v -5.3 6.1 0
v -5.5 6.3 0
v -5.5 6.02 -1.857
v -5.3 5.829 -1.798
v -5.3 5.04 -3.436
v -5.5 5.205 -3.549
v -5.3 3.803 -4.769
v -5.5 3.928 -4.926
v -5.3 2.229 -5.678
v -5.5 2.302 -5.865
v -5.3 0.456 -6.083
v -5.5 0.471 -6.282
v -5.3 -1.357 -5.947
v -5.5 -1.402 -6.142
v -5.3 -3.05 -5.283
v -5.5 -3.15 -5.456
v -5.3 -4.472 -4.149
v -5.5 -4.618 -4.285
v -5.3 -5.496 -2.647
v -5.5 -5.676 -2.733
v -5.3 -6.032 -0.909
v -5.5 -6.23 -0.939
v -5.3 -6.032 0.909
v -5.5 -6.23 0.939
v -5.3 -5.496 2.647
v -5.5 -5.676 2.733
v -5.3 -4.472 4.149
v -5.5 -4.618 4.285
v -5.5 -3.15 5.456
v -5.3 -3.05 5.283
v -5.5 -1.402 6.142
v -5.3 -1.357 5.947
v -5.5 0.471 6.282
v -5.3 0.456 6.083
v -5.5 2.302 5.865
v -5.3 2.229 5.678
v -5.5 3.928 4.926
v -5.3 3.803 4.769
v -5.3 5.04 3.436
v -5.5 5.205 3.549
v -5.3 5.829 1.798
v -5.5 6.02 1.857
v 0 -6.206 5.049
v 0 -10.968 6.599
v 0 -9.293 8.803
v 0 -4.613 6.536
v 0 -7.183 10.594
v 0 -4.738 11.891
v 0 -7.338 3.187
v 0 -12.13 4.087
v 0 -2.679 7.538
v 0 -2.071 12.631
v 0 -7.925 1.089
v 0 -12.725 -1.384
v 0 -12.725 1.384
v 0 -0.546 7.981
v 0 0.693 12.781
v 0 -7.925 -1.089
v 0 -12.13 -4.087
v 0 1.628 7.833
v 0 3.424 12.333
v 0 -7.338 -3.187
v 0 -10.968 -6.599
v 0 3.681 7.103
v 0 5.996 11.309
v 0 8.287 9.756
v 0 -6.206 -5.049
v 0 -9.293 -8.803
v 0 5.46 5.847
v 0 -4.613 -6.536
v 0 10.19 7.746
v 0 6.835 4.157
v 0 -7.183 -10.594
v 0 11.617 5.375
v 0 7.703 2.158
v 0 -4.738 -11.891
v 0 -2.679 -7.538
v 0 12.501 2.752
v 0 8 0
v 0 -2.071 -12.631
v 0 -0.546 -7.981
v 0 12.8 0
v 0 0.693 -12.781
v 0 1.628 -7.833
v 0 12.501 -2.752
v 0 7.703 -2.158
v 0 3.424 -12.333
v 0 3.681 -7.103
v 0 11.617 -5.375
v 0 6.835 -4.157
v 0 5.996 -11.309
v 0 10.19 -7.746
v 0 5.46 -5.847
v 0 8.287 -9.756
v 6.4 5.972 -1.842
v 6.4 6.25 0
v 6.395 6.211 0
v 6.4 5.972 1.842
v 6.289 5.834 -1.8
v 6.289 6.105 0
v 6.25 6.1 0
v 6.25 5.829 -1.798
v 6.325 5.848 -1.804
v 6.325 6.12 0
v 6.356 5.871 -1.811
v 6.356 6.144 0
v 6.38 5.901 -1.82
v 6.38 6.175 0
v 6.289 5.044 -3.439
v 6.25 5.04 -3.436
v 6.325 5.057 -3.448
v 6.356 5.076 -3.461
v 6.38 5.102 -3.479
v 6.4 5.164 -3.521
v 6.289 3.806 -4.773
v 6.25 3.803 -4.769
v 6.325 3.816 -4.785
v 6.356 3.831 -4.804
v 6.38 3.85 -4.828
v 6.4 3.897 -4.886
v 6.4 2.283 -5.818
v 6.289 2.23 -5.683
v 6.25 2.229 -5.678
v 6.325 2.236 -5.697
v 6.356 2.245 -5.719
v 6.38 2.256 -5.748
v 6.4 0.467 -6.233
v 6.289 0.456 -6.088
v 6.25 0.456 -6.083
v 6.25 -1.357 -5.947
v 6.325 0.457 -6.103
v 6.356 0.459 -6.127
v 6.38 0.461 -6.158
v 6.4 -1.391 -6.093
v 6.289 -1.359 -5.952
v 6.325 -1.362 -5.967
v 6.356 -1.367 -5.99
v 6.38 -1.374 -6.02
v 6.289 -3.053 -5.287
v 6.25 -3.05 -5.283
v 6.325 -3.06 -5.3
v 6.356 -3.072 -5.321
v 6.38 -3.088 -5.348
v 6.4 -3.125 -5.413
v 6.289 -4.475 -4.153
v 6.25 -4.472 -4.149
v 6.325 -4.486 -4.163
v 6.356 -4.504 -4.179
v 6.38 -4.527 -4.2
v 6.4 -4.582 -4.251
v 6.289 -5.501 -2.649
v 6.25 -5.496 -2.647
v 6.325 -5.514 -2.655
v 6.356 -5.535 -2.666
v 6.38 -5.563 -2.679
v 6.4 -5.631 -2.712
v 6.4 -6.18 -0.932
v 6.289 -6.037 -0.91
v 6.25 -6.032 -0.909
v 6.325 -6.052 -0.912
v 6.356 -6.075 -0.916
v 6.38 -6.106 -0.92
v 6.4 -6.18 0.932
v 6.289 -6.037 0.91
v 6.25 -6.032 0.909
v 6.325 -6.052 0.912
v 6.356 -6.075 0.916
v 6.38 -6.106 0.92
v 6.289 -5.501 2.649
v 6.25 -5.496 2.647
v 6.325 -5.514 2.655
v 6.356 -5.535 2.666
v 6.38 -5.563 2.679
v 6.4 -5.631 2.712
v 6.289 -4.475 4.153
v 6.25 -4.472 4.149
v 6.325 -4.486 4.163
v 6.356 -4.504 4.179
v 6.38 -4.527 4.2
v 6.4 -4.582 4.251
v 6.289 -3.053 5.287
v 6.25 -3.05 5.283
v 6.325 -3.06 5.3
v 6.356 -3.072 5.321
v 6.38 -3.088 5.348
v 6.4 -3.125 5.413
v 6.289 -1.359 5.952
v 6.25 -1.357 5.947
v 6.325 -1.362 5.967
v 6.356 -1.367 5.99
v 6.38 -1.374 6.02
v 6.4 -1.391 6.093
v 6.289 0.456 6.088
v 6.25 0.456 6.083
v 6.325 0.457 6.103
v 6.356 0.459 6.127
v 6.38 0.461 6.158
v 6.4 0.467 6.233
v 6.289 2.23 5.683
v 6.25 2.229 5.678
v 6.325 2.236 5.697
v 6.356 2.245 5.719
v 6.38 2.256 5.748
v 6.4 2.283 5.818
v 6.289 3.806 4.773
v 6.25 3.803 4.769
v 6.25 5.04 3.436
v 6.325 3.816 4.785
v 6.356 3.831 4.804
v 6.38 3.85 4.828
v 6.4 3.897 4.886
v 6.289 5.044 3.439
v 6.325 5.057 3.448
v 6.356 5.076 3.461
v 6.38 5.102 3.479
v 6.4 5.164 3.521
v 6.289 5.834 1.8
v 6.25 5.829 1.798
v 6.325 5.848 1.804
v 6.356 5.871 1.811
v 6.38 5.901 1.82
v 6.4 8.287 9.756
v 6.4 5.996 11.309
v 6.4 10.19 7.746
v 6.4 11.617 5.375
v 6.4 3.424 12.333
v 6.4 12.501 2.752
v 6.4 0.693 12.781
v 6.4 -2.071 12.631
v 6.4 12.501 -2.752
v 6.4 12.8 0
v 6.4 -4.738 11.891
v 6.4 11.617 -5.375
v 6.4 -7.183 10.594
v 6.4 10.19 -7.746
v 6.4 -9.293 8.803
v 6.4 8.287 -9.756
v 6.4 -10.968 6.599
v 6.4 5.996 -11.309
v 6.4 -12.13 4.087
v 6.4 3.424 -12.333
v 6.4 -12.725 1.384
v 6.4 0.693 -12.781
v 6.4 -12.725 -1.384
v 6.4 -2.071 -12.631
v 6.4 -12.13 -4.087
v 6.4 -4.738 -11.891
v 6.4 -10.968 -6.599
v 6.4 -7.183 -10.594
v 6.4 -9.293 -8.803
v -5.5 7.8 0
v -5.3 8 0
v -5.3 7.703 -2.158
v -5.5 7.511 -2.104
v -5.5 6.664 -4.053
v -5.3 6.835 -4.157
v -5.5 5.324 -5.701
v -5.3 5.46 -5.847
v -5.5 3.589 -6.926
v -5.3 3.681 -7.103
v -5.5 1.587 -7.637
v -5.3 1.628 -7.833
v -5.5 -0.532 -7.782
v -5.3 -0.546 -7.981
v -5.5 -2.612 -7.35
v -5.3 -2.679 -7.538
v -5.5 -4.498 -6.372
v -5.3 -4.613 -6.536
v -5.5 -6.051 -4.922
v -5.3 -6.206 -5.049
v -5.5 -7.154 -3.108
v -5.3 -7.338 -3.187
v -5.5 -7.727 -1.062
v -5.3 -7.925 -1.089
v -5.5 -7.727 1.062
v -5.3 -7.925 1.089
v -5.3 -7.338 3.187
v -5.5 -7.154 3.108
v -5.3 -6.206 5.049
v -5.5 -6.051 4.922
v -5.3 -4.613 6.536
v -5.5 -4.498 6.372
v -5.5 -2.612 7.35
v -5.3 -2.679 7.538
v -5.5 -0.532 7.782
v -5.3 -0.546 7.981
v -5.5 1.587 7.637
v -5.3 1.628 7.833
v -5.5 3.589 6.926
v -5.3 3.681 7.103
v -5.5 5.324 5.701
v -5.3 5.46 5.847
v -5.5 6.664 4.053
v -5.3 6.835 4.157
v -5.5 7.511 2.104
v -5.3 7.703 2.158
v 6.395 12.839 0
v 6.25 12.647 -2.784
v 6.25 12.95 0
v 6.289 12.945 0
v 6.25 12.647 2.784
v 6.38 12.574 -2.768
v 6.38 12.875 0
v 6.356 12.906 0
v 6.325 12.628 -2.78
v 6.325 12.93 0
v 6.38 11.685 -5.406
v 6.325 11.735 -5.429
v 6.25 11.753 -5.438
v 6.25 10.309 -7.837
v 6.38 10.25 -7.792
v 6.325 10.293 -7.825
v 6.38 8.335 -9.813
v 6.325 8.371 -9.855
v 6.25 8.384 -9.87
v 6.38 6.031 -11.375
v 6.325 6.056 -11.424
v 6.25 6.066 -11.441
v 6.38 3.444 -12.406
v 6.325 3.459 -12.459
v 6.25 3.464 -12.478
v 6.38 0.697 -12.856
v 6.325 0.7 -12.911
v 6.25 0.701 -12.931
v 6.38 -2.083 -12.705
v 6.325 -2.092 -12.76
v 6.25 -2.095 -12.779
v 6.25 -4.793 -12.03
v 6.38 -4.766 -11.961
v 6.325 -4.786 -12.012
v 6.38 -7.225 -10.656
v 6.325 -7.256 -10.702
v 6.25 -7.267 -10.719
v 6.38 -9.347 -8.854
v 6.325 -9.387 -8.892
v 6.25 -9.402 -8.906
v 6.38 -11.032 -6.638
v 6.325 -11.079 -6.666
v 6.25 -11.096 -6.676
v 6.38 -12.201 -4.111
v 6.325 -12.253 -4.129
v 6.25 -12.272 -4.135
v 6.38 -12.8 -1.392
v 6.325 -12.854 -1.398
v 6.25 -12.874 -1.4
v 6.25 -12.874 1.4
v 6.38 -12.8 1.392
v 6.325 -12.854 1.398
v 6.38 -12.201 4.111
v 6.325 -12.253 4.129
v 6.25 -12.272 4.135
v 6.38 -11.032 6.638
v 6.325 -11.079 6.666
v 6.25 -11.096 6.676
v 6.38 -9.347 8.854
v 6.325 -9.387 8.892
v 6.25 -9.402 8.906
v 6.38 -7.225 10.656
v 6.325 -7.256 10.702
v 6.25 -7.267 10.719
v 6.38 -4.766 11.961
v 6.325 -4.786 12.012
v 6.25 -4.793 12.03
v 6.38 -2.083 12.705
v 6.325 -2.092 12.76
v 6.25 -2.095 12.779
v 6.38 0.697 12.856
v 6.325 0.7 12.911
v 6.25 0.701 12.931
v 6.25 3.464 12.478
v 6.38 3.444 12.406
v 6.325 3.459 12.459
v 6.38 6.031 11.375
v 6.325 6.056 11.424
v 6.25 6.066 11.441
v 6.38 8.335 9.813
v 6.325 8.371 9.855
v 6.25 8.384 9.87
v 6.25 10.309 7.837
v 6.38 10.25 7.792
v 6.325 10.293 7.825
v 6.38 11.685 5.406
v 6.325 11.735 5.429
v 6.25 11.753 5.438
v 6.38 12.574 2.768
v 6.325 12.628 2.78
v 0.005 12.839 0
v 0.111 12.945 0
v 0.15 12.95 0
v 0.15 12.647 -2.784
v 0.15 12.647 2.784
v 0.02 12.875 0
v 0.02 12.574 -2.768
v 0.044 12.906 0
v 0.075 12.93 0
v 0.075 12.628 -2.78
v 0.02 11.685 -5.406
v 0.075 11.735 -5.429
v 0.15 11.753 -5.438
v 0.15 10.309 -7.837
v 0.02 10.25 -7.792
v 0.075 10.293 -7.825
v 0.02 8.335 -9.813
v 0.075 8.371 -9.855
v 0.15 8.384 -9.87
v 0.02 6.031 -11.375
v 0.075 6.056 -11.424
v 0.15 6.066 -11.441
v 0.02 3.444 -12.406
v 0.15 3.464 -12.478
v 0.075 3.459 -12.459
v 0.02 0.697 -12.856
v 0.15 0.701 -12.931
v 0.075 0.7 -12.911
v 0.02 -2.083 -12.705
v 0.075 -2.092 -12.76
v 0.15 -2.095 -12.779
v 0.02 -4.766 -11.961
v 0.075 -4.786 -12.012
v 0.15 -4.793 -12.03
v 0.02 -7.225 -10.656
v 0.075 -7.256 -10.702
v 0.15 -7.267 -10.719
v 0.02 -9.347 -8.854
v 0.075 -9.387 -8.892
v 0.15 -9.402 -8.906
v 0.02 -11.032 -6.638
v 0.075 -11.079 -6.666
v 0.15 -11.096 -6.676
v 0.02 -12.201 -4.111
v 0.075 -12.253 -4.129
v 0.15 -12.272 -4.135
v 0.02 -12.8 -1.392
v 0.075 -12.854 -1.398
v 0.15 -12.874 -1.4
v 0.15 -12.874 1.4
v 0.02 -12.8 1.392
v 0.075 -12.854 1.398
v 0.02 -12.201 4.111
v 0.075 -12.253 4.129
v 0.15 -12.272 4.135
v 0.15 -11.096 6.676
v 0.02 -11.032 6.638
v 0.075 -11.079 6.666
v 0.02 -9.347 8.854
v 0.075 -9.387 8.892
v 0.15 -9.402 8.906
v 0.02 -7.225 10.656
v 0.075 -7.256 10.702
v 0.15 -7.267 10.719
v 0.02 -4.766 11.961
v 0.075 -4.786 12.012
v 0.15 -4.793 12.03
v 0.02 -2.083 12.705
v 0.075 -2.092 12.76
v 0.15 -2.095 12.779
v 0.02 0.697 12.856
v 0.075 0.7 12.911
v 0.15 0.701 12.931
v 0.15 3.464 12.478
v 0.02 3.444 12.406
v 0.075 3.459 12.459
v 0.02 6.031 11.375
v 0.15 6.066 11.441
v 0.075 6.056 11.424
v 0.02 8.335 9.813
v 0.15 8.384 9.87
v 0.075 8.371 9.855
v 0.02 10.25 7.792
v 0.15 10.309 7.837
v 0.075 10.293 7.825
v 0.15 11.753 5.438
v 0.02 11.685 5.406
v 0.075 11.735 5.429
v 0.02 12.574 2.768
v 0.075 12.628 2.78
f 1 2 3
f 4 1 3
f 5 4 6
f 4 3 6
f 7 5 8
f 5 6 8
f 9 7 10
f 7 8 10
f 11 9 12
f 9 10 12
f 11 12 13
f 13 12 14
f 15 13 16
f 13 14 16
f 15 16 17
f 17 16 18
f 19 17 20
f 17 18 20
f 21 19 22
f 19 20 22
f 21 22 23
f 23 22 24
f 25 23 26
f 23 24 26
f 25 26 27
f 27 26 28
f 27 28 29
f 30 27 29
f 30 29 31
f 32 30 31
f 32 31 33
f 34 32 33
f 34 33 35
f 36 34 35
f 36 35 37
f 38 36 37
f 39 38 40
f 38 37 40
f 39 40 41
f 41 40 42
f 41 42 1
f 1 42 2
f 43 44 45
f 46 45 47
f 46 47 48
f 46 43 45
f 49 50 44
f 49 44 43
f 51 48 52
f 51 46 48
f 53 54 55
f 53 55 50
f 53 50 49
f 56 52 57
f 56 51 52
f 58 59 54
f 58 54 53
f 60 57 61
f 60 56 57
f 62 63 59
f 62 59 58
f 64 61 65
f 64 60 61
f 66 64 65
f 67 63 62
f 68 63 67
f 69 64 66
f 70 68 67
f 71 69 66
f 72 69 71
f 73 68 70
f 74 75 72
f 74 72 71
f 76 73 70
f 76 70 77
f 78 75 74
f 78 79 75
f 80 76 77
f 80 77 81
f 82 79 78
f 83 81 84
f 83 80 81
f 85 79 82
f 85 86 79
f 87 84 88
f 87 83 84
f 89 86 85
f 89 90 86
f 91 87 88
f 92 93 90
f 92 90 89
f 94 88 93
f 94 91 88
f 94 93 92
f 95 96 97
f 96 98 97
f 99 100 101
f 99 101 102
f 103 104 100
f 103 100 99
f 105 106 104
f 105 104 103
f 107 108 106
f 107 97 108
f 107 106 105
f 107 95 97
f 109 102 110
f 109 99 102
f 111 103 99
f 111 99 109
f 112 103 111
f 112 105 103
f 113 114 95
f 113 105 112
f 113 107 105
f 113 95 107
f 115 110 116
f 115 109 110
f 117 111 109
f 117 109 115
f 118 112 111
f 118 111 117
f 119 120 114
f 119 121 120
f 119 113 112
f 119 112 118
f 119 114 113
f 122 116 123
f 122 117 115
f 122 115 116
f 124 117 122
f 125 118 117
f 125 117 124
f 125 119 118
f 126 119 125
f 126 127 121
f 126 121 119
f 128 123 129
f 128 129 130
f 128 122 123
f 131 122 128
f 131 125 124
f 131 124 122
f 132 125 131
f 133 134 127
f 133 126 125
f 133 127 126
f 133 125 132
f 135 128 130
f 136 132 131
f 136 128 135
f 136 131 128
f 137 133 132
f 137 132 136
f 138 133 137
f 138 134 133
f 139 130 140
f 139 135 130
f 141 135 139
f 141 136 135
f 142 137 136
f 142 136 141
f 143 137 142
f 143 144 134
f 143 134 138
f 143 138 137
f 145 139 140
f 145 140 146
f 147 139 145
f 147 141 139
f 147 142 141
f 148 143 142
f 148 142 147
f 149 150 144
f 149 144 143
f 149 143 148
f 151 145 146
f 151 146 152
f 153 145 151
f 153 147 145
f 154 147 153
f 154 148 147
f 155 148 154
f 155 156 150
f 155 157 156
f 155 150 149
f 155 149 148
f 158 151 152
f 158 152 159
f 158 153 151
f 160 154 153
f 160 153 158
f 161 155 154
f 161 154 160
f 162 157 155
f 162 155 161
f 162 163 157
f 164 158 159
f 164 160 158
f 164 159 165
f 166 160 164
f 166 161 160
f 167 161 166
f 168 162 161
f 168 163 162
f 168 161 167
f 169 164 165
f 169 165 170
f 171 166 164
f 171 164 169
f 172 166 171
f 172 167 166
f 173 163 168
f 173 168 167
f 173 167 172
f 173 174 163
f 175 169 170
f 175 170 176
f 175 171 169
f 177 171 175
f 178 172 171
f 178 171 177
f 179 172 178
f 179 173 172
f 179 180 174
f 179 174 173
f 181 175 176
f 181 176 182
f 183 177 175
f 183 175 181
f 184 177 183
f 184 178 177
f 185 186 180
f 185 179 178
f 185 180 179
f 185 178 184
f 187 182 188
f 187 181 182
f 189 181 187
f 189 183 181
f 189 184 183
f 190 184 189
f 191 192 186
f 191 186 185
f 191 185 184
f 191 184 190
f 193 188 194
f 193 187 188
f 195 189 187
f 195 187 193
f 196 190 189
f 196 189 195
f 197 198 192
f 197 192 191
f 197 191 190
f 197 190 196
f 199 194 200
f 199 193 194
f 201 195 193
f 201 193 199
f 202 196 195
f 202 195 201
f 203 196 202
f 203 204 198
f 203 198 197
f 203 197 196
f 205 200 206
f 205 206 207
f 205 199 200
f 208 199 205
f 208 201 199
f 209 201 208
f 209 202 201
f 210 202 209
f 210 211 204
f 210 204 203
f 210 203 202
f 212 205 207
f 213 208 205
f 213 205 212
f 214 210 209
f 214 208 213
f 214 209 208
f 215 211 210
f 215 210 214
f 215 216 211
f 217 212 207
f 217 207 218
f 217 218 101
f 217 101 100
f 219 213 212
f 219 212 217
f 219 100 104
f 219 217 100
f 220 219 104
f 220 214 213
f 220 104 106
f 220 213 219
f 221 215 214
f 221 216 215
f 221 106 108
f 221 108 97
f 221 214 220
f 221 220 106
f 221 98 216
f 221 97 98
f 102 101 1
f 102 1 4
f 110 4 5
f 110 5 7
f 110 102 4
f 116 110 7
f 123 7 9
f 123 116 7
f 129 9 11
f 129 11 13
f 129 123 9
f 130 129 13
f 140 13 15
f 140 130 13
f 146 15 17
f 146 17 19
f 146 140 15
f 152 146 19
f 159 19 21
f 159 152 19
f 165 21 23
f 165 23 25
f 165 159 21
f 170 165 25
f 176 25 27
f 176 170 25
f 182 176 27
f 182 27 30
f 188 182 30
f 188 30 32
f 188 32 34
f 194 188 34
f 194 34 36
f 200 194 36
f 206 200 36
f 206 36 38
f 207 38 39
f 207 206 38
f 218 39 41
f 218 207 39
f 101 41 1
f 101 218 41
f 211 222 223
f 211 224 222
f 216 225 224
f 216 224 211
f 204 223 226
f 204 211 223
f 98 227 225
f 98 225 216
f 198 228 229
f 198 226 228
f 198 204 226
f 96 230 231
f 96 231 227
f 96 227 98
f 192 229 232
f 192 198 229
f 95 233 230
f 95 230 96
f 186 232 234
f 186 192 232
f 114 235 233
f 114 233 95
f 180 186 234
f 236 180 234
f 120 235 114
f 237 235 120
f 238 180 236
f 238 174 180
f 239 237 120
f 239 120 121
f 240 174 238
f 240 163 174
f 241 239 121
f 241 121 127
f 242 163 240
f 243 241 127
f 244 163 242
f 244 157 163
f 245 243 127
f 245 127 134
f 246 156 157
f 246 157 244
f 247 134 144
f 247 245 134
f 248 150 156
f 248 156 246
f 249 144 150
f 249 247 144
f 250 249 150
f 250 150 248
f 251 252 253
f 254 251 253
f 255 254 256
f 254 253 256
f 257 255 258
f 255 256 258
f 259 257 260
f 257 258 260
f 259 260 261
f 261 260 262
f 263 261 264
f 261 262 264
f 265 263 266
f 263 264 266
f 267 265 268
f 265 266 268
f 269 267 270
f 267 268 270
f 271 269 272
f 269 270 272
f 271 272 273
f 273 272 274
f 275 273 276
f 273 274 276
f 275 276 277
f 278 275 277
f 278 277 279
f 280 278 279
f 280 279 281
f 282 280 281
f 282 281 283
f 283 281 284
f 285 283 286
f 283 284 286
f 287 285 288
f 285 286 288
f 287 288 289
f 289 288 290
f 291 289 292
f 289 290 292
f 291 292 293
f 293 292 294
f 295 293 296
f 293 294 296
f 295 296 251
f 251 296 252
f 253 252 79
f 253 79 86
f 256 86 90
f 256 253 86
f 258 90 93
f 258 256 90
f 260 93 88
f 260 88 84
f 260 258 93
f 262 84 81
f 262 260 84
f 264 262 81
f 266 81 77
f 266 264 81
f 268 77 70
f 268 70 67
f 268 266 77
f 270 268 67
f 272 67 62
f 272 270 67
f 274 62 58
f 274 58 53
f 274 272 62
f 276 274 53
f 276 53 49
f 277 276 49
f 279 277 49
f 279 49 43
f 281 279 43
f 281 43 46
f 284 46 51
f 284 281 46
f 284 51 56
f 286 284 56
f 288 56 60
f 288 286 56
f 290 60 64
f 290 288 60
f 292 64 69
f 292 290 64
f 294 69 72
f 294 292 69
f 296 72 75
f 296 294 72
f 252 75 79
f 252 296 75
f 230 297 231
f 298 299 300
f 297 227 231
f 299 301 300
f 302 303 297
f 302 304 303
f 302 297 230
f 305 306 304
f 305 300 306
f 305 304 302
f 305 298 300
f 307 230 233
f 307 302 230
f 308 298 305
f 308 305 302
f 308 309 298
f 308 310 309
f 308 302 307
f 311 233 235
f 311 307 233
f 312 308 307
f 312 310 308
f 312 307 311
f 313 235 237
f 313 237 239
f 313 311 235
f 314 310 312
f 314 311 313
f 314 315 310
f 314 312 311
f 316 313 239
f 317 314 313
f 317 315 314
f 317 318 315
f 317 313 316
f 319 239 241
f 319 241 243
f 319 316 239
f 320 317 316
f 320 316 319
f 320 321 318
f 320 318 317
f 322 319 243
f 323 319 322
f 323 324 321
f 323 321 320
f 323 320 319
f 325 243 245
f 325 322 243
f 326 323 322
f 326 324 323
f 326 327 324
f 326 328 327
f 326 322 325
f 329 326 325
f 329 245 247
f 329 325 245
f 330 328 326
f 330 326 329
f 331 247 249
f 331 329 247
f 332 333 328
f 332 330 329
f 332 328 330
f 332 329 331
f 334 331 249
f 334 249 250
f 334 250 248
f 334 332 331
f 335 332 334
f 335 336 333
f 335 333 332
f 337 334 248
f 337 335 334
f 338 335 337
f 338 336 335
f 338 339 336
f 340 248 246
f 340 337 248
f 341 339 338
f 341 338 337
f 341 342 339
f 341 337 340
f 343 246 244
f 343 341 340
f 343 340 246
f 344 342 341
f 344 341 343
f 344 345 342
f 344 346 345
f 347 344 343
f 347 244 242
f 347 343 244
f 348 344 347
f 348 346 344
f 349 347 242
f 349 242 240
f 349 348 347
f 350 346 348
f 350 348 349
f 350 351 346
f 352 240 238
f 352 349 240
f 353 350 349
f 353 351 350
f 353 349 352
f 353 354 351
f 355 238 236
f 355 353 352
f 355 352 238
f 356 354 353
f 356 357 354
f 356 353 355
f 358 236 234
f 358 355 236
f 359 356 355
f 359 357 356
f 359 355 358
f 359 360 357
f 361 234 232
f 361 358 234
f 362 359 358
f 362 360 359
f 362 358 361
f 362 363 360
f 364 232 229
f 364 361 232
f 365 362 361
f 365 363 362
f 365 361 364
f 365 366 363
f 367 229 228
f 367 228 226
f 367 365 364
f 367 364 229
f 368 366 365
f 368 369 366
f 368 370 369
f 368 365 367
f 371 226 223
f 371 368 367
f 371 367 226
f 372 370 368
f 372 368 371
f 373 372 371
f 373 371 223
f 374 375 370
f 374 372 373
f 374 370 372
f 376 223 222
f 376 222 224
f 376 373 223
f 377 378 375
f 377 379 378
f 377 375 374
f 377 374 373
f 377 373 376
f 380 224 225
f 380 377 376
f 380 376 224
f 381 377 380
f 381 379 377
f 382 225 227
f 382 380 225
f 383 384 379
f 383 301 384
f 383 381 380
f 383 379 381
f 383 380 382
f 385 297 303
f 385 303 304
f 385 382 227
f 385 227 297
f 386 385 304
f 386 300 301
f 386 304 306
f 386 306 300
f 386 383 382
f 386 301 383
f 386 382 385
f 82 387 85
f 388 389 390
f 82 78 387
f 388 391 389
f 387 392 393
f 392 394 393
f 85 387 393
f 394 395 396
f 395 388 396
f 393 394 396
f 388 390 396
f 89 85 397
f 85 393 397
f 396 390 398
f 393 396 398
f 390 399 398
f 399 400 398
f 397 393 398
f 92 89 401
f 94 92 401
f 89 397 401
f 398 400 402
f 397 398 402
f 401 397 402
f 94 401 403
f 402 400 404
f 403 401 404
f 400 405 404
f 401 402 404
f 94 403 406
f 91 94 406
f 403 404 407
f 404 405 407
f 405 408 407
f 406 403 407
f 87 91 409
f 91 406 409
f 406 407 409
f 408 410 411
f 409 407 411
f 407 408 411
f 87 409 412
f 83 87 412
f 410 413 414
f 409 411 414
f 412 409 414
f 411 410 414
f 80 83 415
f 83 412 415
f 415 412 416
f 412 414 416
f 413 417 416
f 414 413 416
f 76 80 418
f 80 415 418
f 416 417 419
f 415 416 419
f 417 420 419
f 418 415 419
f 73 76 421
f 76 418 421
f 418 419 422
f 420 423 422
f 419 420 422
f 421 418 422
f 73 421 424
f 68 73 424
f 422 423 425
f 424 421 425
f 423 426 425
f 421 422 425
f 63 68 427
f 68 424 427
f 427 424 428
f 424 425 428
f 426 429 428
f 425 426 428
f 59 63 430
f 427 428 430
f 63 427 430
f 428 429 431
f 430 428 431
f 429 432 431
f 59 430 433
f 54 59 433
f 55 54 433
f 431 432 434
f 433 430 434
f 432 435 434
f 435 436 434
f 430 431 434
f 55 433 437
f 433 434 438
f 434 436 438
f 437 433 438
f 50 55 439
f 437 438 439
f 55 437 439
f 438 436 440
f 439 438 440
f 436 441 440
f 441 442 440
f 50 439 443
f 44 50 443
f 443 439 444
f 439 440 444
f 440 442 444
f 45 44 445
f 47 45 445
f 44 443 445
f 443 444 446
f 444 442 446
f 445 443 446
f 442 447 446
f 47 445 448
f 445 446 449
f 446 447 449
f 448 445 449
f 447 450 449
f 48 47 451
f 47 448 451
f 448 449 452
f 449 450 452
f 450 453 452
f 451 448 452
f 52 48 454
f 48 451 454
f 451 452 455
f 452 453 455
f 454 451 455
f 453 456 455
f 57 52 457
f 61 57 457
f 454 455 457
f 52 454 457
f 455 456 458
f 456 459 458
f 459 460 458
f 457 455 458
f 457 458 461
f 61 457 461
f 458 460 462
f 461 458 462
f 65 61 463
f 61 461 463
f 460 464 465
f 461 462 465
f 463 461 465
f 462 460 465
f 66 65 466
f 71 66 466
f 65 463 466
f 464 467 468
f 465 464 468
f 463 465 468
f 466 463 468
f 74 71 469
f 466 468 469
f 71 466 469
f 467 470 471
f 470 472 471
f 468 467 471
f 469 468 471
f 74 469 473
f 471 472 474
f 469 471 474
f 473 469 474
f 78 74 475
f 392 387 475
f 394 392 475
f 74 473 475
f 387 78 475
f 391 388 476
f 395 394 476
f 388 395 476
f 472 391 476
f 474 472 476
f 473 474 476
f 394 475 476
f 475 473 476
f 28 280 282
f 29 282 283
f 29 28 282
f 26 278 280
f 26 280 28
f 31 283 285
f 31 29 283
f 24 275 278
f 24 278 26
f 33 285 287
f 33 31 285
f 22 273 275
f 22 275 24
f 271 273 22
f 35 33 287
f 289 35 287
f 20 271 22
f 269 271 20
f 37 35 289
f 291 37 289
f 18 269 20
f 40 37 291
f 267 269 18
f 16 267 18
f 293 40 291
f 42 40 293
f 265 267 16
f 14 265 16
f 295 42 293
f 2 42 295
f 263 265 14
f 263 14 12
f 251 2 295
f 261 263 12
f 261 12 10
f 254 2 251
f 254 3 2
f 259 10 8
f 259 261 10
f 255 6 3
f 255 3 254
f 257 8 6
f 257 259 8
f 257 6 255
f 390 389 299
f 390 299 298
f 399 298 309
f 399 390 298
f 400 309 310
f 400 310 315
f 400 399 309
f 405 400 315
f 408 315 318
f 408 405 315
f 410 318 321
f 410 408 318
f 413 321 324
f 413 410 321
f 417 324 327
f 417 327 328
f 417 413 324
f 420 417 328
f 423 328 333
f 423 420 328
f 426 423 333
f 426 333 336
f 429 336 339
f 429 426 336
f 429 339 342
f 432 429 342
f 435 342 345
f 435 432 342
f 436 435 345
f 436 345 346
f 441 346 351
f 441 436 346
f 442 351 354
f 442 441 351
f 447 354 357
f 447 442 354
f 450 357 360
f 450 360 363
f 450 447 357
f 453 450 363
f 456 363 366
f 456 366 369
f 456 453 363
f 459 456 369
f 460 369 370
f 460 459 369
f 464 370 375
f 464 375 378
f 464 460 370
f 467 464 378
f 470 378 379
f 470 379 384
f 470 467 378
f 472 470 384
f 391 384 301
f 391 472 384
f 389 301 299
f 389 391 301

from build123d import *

# Parameters (mm, degrees)
FILLET1_R     = 0.15
FILLET2_R     = 0.15
CHAMFER1_SIZE = 0.2


with BuildPart() as part:
    # Sketch1 → Revolve1 (revolve)
    with BuildSketch(Plane.XY):
        Polygon((0, 12.95), (0, 8), (-5.5, 8), (-5.5, 6.1), (6.4, 6.1), (6.4, 12.95), align=None)
    revolve(axis=Axis((6.4, 0, 0), (-1, 0, 0)))

    # Fillet1
    fillet1_edges = [part.edges().sort_by_distance(p)[0] for p in [
        (0, -12.95, 0),
        (6.4, -12.95, 0),
    ]]
    fillet(fillet1_edges, radius=FILLET1_R)

    # Fillet2
    fillet2_edges = [part.edges().sort_by_distance(p)[0] for p in [
        (6.4, -6.1, 0),
    ]]
    fillet(fillet2_edges, radius=FILLET2_R)

    # Chamfer1
    chamfer1_edges = [part.edges().sort_by_distance(p)[0] for p in [
        (-5.5, -6.1, 0),
        (-5.5, -8, 0),
    ]]
    chamfer(chamfer1_edges, length=CHAMFER1_SIZE)


solid = part.part
